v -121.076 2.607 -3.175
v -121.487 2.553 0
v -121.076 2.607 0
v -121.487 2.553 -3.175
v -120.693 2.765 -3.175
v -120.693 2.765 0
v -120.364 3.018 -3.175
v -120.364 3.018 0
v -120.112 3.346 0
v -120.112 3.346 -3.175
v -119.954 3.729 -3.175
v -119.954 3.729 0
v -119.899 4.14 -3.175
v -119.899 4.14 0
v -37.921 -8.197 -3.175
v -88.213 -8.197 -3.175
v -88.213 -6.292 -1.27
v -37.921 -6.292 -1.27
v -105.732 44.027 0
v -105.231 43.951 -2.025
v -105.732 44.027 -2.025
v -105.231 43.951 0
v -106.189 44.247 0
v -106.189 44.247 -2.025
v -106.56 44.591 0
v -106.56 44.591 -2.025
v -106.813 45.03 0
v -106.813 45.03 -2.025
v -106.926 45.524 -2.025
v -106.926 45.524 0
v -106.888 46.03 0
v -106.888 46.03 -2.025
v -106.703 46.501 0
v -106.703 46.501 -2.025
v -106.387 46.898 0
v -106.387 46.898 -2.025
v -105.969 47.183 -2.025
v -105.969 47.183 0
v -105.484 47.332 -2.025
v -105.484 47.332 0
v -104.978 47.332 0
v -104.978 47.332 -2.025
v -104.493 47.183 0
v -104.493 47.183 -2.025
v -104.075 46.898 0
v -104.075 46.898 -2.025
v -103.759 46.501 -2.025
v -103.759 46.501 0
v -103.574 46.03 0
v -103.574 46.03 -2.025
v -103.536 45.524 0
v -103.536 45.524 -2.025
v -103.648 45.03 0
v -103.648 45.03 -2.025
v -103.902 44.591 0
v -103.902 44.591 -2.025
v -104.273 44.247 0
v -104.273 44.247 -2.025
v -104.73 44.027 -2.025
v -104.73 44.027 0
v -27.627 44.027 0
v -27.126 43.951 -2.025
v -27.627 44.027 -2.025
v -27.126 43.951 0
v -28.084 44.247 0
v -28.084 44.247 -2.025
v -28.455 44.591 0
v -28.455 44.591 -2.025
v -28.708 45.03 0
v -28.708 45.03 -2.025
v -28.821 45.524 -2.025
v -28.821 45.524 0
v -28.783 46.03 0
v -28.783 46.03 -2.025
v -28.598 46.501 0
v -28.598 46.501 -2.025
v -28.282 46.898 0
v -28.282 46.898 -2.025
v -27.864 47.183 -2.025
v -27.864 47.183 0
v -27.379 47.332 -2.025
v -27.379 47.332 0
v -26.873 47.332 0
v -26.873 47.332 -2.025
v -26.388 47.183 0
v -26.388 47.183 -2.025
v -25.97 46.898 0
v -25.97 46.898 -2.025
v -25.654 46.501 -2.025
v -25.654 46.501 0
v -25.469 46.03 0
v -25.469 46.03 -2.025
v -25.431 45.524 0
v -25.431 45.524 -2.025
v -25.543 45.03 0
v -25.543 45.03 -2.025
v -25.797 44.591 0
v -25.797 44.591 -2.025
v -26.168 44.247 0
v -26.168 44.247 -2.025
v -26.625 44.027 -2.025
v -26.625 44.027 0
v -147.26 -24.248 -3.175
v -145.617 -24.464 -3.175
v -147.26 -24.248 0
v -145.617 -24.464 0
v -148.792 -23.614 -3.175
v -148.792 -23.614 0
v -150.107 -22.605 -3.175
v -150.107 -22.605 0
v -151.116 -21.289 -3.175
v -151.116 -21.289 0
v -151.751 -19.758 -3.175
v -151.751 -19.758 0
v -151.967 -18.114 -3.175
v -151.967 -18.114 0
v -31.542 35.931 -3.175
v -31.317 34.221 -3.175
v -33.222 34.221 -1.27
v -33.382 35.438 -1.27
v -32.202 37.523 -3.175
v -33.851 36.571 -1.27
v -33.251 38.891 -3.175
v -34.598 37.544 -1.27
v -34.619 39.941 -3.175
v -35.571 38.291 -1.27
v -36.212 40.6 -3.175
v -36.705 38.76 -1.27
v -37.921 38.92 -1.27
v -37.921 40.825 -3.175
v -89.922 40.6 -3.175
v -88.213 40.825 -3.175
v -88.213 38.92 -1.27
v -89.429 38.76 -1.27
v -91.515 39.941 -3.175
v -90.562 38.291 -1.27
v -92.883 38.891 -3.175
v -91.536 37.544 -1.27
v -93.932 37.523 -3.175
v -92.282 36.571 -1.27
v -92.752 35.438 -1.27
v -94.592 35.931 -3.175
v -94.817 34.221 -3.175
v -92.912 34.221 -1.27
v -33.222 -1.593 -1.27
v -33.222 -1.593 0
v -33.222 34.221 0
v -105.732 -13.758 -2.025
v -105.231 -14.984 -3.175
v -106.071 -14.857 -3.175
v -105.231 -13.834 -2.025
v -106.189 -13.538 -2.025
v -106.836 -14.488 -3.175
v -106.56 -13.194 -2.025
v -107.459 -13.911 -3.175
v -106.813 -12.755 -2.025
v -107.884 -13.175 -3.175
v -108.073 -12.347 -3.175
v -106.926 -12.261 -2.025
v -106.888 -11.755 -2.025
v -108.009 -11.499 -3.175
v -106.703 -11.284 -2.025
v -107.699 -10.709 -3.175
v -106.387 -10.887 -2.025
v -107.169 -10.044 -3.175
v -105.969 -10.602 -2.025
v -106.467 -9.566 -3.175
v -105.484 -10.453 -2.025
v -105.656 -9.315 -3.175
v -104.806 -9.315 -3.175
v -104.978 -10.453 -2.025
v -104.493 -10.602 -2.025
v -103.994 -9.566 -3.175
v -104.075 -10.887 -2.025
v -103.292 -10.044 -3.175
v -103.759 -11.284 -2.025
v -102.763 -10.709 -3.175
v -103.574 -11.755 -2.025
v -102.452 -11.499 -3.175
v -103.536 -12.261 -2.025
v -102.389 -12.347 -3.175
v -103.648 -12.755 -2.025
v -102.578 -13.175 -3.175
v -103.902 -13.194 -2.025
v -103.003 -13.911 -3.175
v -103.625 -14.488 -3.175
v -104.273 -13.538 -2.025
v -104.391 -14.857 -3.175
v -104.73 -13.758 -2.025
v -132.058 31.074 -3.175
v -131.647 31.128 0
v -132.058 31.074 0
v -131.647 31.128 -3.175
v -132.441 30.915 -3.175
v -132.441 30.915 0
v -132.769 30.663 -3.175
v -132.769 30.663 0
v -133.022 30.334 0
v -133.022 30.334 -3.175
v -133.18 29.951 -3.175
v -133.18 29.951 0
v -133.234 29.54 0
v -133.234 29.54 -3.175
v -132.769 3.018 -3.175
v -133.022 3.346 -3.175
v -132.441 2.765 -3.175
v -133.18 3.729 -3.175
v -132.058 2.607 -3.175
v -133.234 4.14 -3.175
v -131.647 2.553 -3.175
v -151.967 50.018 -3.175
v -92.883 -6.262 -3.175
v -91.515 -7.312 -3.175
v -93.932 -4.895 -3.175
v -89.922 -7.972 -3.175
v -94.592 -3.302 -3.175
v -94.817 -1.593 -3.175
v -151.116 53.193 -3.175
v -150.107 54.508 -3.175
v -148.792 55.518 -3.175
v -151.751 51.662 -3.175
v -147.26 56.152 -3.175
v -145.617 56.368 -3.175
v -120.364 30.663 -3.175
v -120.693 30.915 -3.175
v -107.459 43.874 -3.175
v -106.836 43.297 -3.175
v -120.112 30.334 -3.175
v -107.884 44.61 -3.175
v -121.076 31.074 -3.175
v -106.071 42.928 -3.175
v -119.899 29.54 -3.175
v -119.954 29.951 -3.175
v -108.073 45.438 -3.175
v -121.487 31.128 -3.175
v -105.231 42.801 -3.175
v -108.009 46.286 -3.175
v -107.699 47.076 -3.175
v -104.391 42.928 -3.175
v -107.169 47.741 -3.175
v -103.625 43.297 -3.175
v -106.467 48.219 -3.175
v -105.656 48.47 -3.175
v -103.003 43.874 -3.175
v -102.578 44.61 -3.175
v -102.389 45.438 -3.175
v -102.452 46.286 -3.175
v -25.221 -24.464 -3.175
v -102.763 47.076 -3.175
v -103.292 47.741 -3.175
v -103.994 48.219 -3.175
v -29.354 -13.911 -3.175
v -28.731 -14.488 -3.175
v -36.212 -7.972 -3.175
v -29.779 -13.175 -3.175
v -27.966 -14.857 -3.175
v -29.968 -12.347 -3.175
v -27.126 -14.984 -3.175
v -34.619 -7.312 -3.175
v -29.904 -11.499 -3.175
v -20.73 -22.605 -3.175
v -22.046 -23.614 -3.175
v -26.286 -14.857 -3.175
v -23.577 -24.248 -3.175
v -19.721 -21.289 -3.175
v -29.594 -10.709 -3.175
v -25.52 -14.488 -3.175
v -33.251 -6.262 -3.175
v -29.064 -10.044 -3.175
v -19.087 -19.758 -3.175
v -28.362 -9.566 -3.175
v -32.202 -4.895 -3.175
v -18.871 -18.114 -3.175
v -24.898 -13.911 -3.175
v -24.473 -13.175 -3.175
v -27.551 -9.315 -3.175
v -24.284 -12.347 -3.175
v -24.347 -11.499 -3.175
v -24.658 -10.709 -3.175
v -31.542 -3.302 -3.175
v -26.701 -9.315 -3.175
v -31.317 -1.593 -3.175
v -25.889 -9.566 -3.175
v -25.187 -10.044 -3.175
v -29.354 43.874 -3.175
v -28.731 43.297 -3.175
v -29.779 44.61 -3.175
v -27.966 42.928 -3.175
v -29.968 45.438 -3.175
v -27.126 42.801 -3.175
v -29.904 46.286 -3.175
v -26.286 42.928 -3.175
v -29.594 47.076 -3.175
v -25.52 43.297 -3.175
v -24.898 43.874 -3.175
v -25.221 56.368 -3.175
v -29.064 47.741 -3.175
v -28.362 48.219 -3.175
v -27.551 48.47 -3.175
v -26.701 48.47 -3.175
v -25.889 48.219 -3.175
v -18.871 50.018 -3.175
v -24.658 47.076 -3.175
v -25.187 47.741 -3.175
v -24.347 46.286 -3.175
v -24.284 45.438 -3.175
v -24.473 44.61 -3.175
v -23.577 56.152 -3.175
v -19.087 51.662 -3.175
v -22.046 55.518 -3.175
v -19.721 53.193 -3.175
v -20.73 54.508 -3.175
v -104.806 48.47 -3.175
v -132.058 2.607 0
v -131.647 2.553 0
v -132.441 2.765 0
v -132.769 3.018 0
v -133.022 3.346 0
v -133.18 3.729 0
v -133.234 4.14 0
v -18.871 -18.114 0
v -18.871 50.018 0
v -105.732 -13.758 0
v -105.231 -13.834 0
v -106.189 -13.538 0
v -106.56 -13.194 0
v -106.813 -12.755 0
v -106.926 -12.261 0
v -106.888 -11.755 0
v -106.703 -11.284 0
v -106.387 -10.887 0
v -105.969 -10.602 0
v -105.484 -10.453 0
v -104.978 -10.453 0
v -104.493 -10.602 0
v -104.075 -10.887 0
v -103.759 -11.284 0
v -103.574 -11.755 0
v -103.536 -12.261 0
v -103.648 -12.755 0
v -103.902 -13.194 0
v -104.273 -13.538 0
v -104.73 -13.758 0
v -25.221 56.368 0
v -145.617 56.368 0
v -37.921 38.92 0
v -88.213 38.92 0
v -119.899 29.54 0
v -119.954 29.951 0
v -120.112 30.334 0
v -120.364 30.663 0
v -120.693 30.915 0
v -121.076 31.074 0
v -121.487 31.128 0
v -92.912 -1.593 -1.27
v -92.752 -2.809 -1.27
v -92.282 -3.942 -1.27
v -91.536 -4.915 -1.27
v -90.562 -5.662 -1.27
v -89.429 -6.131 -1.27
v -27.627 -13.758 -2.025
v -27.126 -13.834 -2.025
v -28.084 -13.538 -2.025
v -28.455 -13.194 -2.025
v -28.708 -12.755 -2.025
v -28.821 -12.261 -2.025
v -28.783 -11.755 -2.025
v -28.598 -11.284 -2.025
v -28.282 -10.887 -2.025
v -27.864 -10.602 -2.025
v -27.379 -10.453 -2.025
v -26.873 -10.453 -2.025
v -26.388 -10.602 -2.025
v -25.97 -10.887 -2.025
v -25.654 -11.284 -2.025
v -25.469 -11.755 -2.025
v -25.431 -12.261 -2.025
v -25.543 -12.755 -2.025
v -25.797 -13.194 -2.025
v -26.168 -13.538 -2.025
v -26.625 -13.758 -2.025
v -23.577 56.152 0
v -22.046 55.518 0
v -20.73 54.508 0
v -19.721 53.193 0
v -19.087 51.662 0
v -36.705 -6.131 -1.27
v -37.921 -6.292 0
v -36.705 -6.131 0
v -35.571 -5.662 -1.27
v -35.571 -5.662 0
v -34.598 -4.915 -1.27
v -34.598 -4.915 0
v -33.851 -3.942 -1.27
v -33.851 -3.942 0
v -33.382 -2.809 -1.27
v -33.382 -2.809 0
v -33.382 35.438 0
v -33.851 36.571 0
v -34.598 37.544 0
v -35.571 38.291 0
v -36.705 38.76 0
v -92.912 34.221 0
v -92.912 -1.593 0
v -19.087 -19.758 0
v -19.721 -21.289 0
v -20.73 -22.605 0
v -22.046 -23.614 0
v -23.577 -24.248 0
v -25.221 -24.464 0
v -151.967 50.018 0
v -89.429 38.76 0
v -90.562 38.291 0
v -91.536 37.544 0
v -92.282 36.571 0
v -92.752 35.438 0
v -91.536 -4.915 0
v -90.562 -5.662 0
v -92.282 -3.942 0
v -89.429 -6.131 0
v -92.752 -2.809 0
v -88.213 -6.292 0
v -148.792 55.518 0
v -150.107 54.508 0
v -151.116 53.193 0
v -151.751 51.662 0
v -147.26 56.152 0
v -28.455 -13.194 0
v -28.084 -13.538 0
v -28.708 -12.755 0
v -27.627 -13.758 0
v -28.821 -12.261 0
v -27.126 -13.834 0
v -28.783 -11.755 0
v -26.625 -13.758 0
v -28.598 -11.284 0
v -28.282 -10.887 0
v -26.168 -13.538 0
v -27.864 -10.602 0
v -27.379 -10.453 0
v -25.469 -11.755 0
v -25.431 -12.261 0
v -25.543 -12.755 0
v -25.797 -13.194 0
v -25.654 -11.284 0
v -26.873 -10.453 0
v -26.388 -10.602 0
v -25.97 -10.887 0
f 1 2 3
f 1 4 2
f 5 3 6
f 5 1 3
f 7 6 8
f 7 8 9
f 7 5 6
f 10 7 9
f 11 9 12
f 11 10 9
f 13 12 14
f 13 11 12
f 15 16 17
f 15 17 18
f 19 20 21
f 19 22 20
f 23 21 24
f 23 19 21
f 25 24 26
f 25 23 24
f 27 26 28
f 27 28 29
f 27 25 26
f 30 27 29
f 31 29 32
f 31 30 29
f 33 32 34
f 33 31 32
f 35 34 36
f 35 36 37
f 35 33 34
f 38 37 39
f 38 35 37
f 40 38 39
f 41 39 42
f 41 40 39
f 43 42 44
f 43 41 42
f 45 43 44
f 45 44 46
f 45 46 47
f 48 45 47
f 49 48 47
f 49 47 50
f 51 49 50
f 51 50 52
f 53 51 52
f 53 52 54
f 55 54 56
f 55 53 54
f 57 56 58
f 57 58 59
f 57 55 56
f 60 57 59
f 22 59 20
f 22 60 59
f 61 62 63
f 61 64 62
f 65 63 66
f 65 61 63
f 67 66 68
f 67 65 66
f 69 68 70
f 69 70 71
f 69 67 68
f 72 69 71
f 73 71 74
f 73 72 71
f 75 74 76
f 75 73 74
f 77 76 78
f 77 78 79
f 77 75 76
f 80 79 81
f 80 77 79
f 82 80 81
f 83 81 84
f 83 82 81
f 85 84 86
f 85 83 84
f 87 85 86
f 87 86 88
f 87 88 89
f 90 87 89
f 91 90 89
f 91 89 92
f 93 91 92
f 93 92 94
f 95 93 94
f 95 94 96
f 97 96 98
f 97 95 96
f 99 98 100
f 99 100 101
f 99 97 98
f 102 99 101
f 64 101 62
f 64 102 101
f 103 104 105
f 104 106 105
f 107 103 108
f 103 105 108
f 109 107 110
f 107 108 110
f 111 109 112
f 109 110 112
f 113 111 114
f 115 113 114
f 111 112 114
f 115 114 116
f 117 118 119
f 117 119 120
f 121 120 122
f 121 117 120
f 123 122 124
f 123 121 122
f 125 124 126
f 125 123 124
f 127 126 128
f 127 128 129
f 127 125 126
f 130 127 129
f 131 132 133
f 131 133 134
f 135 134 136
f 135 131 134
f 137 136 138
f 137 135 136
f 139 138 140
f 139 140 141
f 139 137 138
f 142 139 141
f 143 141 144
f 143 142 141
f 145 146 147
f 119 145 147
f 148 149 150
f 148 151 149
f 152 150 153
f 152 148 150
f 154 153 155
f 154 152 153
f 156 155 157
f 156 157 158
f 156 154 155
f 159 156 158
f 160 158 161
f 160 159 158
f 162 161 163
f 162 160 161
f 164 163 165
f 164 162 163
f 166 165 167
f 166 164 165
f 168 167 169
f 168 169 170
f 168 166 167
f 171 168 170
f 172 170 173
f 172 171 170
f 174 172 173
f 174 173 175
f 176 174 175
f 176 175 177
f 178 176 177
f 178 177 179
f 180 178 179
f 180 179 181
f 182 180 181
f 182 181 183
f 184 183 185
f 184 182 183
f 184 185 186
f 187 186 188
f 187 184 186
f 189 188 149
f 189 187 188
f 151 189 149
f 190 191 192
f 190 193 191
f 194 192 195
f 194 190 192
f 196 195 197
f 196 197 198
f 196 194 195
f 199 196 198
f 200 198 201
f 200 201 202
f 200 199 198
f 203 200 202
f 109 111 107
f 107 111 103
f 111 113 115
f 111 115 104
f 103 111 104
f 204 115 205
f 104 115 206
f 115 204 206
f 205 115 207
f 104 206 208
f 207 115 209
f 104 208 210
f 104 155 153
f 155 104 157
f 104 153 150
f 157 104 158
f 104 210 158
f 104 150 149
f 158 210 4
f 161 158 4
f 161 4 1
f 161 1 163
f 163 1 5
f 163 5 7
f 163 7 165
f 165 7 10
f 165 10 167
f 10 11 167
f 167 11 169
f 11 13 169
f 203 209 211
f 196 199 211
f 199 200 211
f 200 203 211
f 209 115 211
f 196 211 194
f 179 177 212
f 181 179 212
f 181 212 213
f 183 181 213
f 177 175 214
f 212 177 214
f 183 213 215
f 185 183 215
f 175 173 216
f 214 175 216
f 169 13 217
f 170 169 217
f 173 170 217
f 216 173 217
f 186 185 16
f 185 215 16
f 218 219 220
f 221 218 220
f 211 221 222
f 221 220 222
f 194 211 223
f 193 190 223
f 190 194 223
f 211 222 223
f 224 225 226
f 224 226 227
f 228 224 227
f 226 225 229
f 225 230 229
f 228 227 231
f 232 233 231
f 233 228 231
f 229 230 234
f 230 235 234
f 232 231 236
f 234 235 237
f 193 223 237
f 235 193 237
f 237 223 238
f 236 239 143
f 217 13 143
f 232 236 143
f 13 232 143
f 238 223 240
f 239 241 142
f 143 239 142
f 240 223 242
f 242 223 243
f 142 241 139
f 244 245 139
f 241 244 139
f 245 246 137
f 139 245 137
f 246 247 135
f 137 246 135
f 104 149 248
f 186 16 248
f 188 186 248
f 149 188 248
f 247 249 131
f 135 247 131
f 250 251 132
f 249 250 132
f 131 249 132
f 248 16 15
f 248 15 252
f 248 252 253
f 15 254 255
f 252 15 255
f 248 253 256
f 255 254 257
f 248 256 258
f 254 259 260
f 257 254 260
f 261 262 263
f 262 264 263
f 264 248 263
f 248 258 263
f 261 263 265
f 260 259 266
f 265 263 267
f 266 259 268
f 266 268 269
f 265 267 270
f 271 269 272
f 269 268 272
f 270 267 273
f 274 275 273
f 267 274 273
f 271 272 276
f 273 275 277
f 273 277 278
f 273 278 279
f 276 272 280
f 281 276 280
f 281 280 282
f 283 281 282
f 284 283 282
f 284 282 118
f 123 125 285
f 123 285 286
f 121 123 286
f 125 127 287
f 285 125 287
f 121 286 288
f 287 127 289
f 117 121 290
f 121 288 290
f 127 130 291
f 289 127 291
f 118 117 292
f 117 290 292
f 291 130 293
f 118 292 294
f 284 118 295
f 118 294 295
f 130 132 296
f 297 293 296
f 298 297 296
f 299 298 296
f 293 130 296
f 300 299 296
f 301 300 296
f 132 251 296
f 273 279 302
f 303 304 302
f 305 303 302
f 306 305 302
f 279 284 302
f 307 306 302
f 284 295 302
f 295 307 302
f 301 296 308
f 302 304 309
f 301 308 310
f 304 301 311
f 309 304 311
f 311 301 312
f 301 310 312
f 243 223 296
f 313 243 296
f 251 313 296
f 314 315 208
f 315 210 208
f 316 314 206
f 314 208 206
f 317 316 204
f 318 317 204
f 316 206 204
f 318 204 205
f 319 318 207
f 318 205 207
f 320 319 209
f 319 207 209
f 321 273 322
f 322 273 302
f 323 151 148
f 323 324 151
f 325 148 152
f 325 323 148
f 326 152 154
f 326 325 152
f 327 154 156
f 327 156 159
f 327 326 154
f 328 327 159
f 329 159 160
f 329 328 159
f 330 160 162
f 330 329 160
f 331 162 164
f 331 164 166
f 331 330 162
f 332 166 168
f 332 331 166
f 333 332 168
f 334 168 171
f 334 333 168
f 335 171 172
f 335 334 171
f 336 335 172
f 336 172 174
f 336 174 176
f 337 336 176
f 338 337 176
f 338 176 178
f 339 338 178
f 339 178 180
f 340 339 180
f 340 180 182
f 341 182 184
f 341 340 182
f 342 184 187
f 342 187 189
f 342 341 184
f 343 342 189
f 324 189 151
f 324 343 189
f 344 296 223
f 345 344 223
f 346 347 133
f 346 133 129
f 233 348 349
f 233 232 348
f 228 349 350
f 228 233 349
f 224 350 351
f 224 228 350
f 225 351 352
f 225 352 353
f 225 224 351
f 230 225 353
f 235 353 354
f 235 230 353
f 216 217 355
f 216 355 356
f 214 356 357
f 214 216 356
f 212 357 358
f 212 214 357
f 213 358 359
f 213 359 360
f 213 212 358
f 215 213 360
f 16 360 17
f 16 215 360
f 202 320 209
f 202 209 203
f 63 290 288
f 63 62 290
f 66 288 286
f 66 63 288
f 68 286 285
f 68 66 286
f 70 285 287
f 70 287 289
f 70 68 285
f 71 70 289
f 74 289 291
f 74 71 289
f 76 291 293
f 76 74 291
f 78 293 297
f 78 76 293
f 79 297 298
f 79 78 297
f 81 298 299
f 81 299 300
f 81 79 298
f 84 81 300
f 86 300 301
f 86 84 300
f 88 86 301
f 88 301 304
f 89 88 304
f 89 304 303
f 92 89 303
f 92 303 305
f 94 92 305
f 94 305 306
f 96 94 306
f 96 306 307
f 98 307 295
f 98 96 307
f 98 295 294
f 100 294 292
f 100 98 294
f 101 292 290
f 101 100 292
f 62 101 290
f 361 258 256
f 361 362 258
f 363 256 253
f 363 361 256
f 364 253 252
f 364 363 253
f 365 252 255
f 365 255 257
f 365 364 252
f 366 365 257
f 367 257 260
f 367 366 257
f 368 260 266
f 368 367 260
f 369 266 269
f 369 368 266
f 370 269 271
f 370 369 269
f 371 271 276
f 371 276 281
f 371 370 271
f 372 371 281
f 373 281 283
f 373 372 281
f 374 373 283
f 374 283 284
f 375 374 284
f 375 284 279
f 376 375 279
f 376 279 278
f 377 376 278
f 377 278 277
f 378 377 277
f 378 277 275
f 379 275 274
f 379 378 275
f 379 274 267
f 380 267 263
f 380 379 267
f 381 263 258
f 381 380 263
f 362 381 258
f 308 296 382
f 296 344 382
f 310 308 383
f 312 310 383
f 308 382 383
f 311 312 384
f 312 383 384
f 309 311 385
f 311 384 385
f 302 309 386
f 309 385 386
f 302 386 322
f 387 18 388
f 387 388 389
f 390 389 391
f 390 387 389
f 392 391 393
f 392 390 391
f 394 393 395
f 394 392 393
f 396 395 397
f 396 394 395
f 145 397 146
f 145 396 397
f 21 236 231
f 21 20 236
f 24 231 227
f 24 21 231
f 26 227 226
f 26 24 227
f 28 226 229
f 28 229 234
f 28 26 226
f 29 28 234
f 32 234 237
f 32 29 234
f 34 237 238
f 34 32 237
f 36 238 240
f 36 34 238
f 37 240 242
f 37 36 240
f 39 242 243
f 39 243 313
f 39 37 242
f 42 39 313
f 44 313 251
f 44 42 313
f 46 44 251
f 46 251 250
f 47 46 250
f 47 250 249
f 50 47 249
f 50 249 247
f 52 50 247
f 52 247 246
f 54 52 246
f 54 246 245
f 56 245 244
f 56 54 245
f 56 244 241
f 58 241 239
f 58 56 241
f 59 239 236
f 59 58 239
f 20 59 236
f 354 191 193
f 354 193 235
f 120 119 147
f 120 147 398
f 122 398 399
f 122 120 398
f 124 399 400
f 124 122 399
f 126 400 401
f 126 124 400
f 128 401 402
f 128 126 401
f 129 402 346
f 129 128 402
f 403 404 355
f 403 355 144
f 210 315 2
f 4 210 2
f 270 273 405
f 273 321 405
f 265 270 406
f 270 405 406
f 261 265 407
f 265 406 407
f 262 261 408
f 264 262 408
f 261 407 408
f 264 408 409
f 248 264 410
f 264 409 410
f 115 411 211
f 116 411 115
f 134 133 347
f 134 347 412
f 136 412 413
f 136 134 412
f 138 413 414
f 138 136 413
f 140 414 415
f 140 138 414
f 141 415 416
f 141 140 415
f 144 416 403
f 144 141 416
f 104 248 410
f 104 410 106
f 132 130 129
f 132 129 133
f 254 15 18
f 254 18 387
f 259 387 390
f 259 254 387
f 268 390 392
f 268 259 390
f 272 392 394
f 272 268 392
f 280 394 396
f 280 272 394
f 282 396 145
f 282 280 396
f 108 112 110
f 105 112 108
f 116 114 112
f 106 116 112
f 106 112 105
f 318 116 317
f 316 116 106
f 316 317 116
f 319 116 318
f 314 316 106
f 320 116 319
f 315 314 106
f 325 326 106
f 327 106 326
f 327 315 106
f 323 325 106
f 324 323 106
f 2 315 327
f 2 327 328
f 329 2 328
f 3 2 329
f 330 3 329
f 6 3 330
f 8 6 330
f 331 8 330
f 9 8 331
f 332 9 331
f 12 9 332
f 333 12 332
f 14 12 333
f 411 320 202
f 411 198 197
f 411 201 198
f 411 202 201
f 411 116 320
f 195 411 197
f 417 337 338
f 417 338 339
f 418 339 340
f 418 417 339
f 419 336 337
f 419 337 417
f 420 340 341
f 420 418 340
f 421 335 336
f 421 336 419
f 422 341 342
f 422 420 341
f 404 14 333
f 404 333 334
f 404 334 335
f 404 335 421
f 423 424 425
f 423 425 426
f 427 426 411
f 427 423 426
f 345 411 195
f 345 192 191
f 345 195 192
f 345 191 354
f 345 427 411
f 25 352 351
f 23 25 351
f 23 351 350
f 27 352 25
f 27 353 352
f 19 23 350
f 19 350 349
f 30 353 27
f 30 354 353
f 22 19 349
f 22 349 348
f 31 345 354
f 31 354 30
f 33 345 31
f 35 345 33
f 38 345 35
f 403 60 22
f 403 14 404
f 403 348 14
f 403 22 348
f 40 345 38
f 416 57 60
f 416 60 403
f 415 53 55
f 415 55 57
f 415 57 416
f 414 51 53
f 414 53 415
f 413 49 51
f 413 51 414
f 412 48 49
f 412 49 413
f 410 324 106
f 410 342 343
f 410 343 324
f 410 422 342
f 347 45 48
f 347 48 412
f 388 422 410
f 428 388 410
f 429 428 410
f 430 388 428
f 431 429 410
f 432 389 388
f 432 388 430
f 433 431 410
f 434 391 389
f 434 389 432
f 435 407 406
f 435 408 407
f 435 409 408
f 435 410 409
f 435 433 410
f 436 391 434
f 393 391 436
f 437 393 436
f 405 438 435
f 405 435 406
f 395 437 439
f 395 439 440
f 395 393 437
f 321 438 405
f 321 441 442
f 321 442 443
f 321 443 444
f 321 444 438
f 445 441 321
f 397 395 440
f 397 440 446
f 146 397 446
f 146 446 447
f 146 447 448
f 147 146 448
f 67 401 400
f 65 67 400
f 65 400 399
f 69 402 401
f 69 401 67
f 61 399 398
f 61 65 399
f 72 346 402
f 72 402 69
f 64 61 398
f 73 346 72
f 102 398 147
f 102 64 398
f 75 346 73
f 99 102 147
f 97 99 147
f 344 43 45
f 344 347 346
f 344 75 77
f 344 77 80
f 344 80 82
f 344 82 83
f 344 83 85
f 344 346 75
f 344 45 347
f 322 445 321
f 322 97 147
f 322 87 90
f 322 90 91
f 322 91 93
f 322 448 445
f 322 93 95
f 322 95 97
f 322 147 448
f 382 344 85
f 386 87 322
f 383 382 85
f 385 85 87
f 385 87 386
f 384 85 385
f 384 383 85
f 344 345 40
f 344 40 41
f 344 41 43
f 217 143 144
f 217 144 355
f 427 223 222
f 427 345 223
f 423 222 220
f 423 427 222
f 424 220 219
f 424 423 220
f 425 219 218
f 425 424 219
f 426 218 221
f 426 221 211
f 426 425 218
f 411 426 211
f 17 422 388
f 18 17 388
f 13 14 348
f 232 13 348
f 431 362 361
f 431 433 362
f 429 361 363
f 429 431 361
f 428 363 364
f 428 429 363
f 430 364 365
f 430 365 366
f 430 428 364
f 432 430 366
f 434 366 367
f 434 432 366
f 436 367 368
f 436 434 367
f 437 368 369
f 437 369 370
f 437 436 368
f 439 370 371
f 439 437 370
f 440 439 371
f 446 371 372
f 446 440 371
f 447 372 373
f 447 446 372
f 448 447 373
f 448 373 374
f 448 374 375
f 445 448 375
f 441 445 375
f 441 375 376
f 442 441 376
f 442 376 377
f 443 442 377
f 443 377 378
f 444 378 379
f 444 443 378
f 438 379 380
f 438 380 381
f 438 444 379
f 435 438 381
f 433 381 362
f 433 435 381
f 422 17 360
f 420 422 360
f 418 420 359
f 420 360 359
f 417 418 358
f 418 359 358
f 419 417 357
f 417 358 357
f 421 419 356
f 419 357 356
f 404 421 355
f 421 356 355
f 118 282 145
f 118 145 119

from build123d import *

# Parameters (mm, degrees)
BOSS_EXTRUDE1_DEPTH             = 3.175
F_6_CLEARANCE_HOLE1_AT_2_COUNT  = 2
F_6_CLEARANCE_HOLE1_AT_2_PITCH  = 202.184
F_6_CLEARANCE_HOLE1_AT_3_COUNT  = 2
F_6_CLEARANCE_HOLE1_AT_3_PITCH  = 245.533205315
F_6_CLEARANCE_HOLE1_AT_4_COUNT  = 2
F_6_CLEARANCE_HOLE1_AT_4_PITCH  = 294.732330958
F_6_CLEARANCE_HOLE1_AT_5_COUNT  = 2
F_6_CLEARANCE_HOLE1_AT_5_PITCH  = 209.296
F_6_CLEARANCE_HOLE1_AT_6_COUNT  = 2
F_6_CLEARANCE_HOLE1_AT_6_PITCH  = 172.811757411
F_6_CLEARANCE_HOLE1_AT_7_COUNT  = 2
F_6_CLEARANCE_HOLE1_AT_7_PITCH  = 57.300187604
F_6_CLEARANCE_HOLE1_AT_8_COUNT  = 2
F_6_CLEARANCE_HOLE1_AT_8_PITCH  = 291.003755082
F_6_CLEARANCE_HOLE1_AT_9_COUNT  = 2
F_6_CLEARANCE_HOLE1_AT_9_PITCH  = 232.431512666
F_6_CLEARANCE_HOLE1_AT_10_COUNT = 2
F_6_CLEARANCE_HOLE1_AT_10_PITCH = 101.092
SKETCH23_R                      = 24.765
CUT_EXTRUDE10_DEPTH             = 191.76187976
SKETCH24_W                      = 59.69
SKETCH24_H                      = 45.212
CUT_EXTRUDE11_DEPTH             = 191.76187976
FILLET2_R                       = 4.699
CHAMFER1_SIZE                   = 1.905
M3_CLEARANCE_HOLE3_AT_2_COUNT   = 2
M3_CLEARANCE_HOLE3_AT_2_PITCH   = 49.391408666
M3_CLEARANCE_HOLE3_AT_3_COUNT   = 2
M3_CLEARANCE_HOLE3_AT_3_PITCH   = 69.85
M3_CLEARANCE_HOLE3_AT_4_COUNT   = 2
M3_CLEARANCE_HOLE3_AT_4_PITCH   = 49.391408666
M3_CLEARANCE_HOLE1_D            = 3.6
M3_CLEARANCE_HOLE1_CSINK_D      = 5.7
M3_CLEARANCE_HOLE1_CSINK_ANGLE  = 90
M3_CLEARANCE_HOLE2_AT_2_COUNT   = 2
M3_CLEARANCE_HOLE2_AT_2_PITCH   = 56.70042
M3_CLEARANCE_HOLE2_AT_3_COUNT   = 2
M3_CLEARANCE_HOLE2_AT_3_PITCH   = 102.00589147
M3_CLEARANCE_HOLE2_AT_4_COUNT   = 2
M3_CLEARANCE_HOLE2_AT_4_PITCH   = 109.267844742
M3_CLEARANCE_HOLE2_AT_5_COUNT   = 2
M3_CLEARANCE_HOLE2_AT_5_PITCH   = 65.600653918
M3_CLEARANCE_HOLE2_AT_6_COUNT   = 2
M3_CLEARANCE_HOLE2_AT_6_PITCH   = 76.404880698
M3_CLEARANCE_HOLE2_AT_7_COUNT   = 2
M3_CLEARANCE_HOLE2_AT_7_PITCH   = 27.404059918
M3_CLEARANCE_HOLE2_AT_8_COUNT   = 2
M3_CLEARANCE_HOLE2_AT_8_PITCH   = 55.968061912
SKETCH35_W                      = 13.335
SKETCH35_H                      = 28.575
CUT_EXTRUDE12_DEPTH             = 191.76187976
FILLET1_R                       = 1.5875
F_8_0MM_DOWEL_HOLE1_D           = 8
M3_CLEARANCE_HOLE4_AT_2_COUNT   = 2
M3_CLEARANCE_HOLE4_AT_2_PITCH   = 78.105
M3_CLEARANCE_HOLE4_AT_3_COUNT   = 2
M3_CLEARANCE_HOLE4_AT_3_PITCH   = 97.157075141
M3_CLEARANCE_HOLE4_AT_4_COUNT   = 2
M3_CLEARANCE_HOLE4_AT_4_PITCH   = 57.785
SKETCH42_OUTSIDE_W              = 382.23
SKETCH42_OUTSIDE_H              = 308.826
SKETCH42_OUTSIDE_W_2            = 133.096408578
SKETCH42_OUTSIDE_H_2            = 80.832743403
CUT_EXTRUDE13_DEPTH             = 191.76187976
FILLET3_R                       = 6.35


with BuildPart() as part:
    # Sketch1 → Boss-Extrude1 (new body)
    with BuildSketch(Plane.XY):
        with BuildLine():
            Line((-151.96693, 98.7552), (-151.96693, -98.7552))
            ThreePointArc((-151.96693, -98.7552), (-147.131262957, -110.429532957), (-135.45693, -115.2652))
            Line((-135.45693, -115.2652), (135.45693, -115.2652))
            ThreePointArc((135.45693, -115.2652), (147.131262957, -110.429532957), (151.96693, -98.7552))
            Line((151.96693, -98.7552), (151.96693, 98.7552))
            ThreePointArc((151.96693, 98.7552), (147.131262957, 110.429532957), (135.45693, 115.2652))
            Line((135.45693, 115.2652), (-135.45693, 115.2652))
            ThreePointArc((-135.45693, 115.2652), (-147.131262957, 110.429532957), (-151.96693, 98.7552))
        make_face()
    extrude(amount=-BOSS_EXTRUDE1_DEPTH)

    # Sketch3 → #6 Clearance Hole1 (revolve, cut)
    with BuildSketch(Plane(origin=(101.092, 104.648, 0), x_dir=(0, -1, 0), z_dir=(1, 0, 0))):
        Polygon((0, 0), (0, 3.175), (3.3655, 3.175), (2.15265, 2.157298012), (2.15265, 0), align=None)
    f_6_clearance_hole1 = revolve(axis=Axis((101.092, 104.648, 6.35), (0, 0, -1)), mode=Mode.SUBTRACT)

    # #6 Clearance Hole1 at 2: #6 Clearance Hole1 ×2
    with Locations(*[(-i * F_6_CLEARANCE_HOLE1_AT_2_PITCH, 0, 0) for i in range(1, F_6_CLEARANCE_HOLE1_AT_2_COUNT)]):
        add(f_6_clearance_hole1, mode=Mode.SUBTRACT)

    # #6 Clearance Hole1 at 3: #6 Clearance Hole1 ×2
    with Locations(*[Vector(-0.9858574105677721, -0.1675862942743448, 0) * (i * F_6_CLEARANCE_HOLE1_AT_3_PITCH) for i in range(1, F_6_CLEARANCE_HOLE1_AT_3_COUNT)]):
        add(f_6_clearance_hole1, mode=Mode.SUBTRACT)

    # #6 Clearance Hole1 at 4: #6 Clearance Hole1 ×2
    with Locations(*[Vector(-0.8212900471859665, -0.5705108749123656, 0) * (i * F_6_CLEARANCE_HOLE1_AT_4_PITCH) for i in range(1, F_6_CLEARANCE_HOLE1_AT_4_COUNT)]):
        add(f_6_clearance_hole1, mode=Mode.SUBTRACT)

    # #6 Clearance Hole1 at 5: #6 Clearance Hole1 ×2
    with Locations(*[(0, -i * F_6_CLEARANCE_HOLE1_AT_5_PITCH, 0) for i in range(1, F_6_CLEARANCE_HOLE1_AT_5_COUNT)]):
        add(f_6_clearance_hole1, mode=Mode.SUBTRACT)

    # #6 Clearance Hole1 at 6: #6 Clearance Hole1 ×2
    with Locations(*[Vector(0.23075241289949347, -0.9730124993755537, 0) * (i * F_6_CLEARANCE_HOLE1_AT_6_PITCH) for i in range(1, F_6_CLEARANCE_HOLE1_AT_6_COUNT)]):
        add(f_6_clearance_hole1, mode=Mode.SUBTRACT)

    # #6 Clearance Hole1 at 7: #6 Clearance Hole1 ×2
    with Locations(*[Vector(0.6959266918172804, -0.7181128320927402, 0) * (i * F_6_CLEARANCE_HOLE1_AT_7_PITCH) for i in range(1, F_6_CLEARANCE_HOLE1_AT_7_COUNT)]):
        add(f_6_clearance_hole1, mode=Mode.SUBTRACT)

    # #6 Clearance Hole1 at 8: #6 Clearance Hole1 ×2
    with Locations(*[Vector(-0.6947814125038304, -0.719220959677332, 0) * (i * F_6_CLEARANCE_HOLE1_AT_8_PITCH) for i in range(1, F_6_CLEARANCE_HOLE1_AT_8_COUNT)]):
        add(f_6_clearance_hole1, mode=Mode.SUBTRACT)

    # #6 Clearance Hole1 at 9: #6 Clearance Hole1 ×2
    with Locations(*[Vector(-0.4349324187613887, -0.9004630981391565, 0) * (i * F_6_CLEARANCE_HOLE1_AT_9_PITCH) for i in range(1, F_6_CLEARANCE_HOLE1_AT_9_COUNT)]):
        add(f_6_clearance_hole1, mode=Mode.SUBTRACT)

    # #6 Clearance Hole1 at 10: #6 Clearance Hole1 ×2
    with Locations(*[(-i * F_6_CLEARANCE_HOLE1_AT_10_PITCH, 0, 0) for i in range(1, F_6_CLEARANCE_HOLE1_AT_10_COUNT)]):
        add(f_6_clearance_hole1, mode=Mode.SUBTRACT)

    # Sketch23 → Cut-Extrude10 (cut, through all)
    with BuildSketch(Plane.XY):
        with Locations((104.26573, 42.164)):
            Circle(SKETCH23_R)
    extrude(amount=-CUT_EXTRUDE10_DEPTH, mode=Mode.SUBTRACT)

    # Sketch24 → Cut-Extrude11 (cut, through all)
    with BuildSketch(Plane.XY):
        with Locations((-63.06693, 16.31442)):
            Rectangle(SKETCH24_W, SKETCH24_H)
    extrude(amount=-CUT_EXTRUDE11_DEPTH, mode=Mode.SUBTRACT)

    # Fillet2
    fillet2_edges = [part.edges().sort_by_distance(p)[0] for p in [
        (-92.91193, -6.29158, -1.5875),
        (-92.91193, 38.92042, -1.5875),
        (-33.22193, 38.92042, -1.5875),
        (-33.22193, -6.29158, -1.5875),
    ]]
    fillet(fillet2_edges, radius=FILLET2_R)

    # Chamfer1
    chamfer1_edges = [part.edges().sort_by_distance(p)[0] for p in [
        (-33.22193, 16.31442, -3.175),
        (-63.06693, -6.29158, -3.175),
        (-92.91193, 16.31442, -3.175),
        (-63.06693, 38.92042, -3.175),
        (-34.598235235, -4.915274765, -3.175),
        (-91.535624765, -4.915274765, -3.175),
        (-91.535624765, 37.544114765, -3.175),
        (-34.598235235, 37.544114765, -3.175),
    ]]
    chamfer(chamfer1_edges, length=CHAMFER1_SIZE)

    # Sketch30 → M3 Clearance Hole3 (revolve, cut)
    with BuildSketch(Plane(origin=(79.570025667, 66.859704333, 0), x_dir=(0, -1, 0), z_dir=(1, 0, 0))):
        Polygon((0, 0), (0, 3.175), (2.85, 3.175), (1.8, 2.125), (1.8, 0), align=None)
    m3_clearance_hole3 = revolve(axis=Axis((79.570025667, 66.859704333, 6.35), (0, 0, -1)), mode=Mode.SUBTRACT)

    # M3 Clearance Hole3 at 2: M3 Clearance Hole3 ×2
    with Locations(*[(i * M3_CLEARANCE_HOLE3_AT_2_PITCH, 0, 0) for i in range(1, M3_CLEARANCE_HOLE3_AT_2_COUNT)]):
        add(m3_clearance_hole3, mode=Mode.SUBTRACT)

    # M3 Clearance Hole3 at 3: M3 Clearance Hole3 ×2
    with Locations(*[Vector(0.7071067811865477, -0.7071067811865475, 0) * (i * M3_CLEARANCE_HOLE3_AT_3_PITCH) for i in range(1, M3_CLEARANCE_HOLE3_AT_3_COUNT)]):
        add(m3_clearance_hole3, mode=Mode.SUBTRACT)

    # M3 Clearance Hole3 at 4: M3 Clearance Hole3 ×2
    with Locations(*[(0, -i * M3_CLEARANCE_HOLE3_AT_4_PITCH, 0) for i in range(1, M3_CLEARANCE_HOLE3_AT_4_COUNT)]):
        add(m3_clearance_hole3, mode=Mode.SUBTRACT)

    # M3 Clearance Hole1 (through all)
    with Locations(Plane(origin=(0, 0, -3.175), x_dir=(-1, 0, 0), z_dir=(0, 0, -1))):
        with Locations((17.67693, -38.5952), (117.67693, -38.5952), (117.67693, -88.5952), (17.67693, -88.5952)):
            CounterSinkHole(M3_CLEARANCE_HOLE1_D / 2, M3_CLEARANCE_HOLE1_CSINK_D / 2, counter_sink_angle=M3_CLEARANCE_HOLE1_CSINK_ANGLE)

    # Sketch34 → M3 Clearance Hole2 (revolve, cut)
    with BuildSketch(Plane(origin=(25.25193, -75.5297, 0), x_dir=(0, -1, 0), z_dir=(1, 0, 0))):
        Polygon((0, 0), (0, 3.175), (2.85, 3.175), (1.8, 2.125), (1.8, 0), align=None)
    m3_clearance_hole2 = revolve(axis=Axis((25.25193, -75.5297, 6.35), (0, 0, -1)), mode=Mode.SUBTRACT)

    # M3 Clearance Hole2 at 2: M3 Clearance Hole2 ×2
    with Locations(*[(i * M3_CLEARANCE_HOLE2_AT_2_PITCH, 0, 0) for i in range(1, M3_CLEARANCE_HOLE2_AT_2_COUNT)]):
        add(m3_clearance_hole2, mode=Mode.SUBTRACT)

    # M3 Clearance Hole2 at 3: M3 Clearance Hole2 ×2
    with Locations(*[Vector(0.9983315525499471, -0.05774176290357108, 0) * (i * M3_CLEARANCE_HOLE2_AT_3_PITCH) for i in range(1, M3_CLEARANCE_HOLE2_AT_3_COUNT)]):
        add(m3_clearance_hole2, mode=Mode.SUBTRACT)

    # M3 Clearance Hole2 at 4: M3 Clearance Hole2 ×2
    with Locations(*[Vector(0.9319823250907686, 0.36250371821321364, 0) * (i * M3_CLEARANCE_HOLE2_AT_4_PITCH) for i in range(1, M3_CLEARANCE_HOLE2_AT_4_COUNT)]):
        add(m3_clearance_hole2, mode=Mode.SUBTRACT)

    # M3 Clearance Hole2 at 5: M3 Clearance Hole2 ×2
    with Locations(*[Vector(0.9959611085814934, -0.089785690358334, 0) * (i * M3_CLEARANCE_HOLE2_AT_5_PITCH) for i in range(1, M3_CLEARANCE_HOLE2_AT_5_COUNT)]):
        add(m3_clearance_hole2, mode=Mode.SUBTRACT)

    # M3 Clearance Hole2 at 6: M3 Clearance Hole2 ×2
    with Locations(*[Vector(0.8551246910281444, 0.5184223787550272, 0) * (i * M3_CLEARANCE_HOLE2_AT_6_PITCH) for i in range(1, M3_CLEARANCE_HOLE2_AT_6_COUNT)]):
        add(m3_clearance_hole2, mode=Mode.SUBTRACT)

    # M3 Clearance Hole2 at 7: M3 Clearance Hole2 ×2
    with Locations(*[Vector(0.2682084341495708, 0.9633609063331537, 0) * (i * M3_CLEARANCE_HOLE2_AT_7_PITCH) for i in range(1, M3_CLEARANCE_HOLE2_AT_7_COUNT)]):
        add(m3_clearance_hole2, mode=Mode.SUBTRACT)

    # M3 Clearance Hole2 at 8: M3 Clearance Hole2 ×2
    with Locations(*[Vector(0.8817603882311722, 0.47169759141468215, 0) * (i * M3_CLEARANCE_HOLE2_AT_8_PITCH) for i in range(1, M3_CLEARANCE_HOLE2_AT_8_COUNT)]):
        add(m3_clearance_hole2, mode=Mode.SUBTRACT)

    # Sketch35 → Cut-Extrude12 (cut, through all)
    with BuildSketch(Plane.XY):
        with Locations((-126.56693, 16.8402)):
            Rectangle(SKETCH35_W, SKETCH35_H)
    extrude(amount=-CUT_EXTRUDE12_DEPTH, mode=Mode.SUBTRACT)

    # Fillet1
    fillet1_edges = [part.edges().sort_by_distance(p)[0] for p in [
        (-133.23443, 2.5527, -1.5875),
        (-133.23443, 31.1277, -1.5875),
        (-119.89943, 31.1277, -1.5875),
        (-119.89943, 2.5527, -1.5875),
    ]]
    fillet(fillet1_edges, radius=FILLET1_R)

    # Ø8.0mm Dowel Hole1 (through all)
    with Locations(Plane(origin=(0, 0, -3.175), x_dir=(-1, 0, 0), z_dir=(0, 0, -1))):
        with Locations((12.26693, 3.61442), (12.26693, 29.01442)):
            Hole(F_8_0MM_DOWEL_HOLE1_D / 2)

    # Sketch39 → M3 Clearance Hole4 (revolve, cut)
    with BuildSketch(Plane(origin=(-105.23093, 45.65142, 0), x_dir=(0, -1, 0), z_dir=(1, 0, 0))):
        Polygon((0, 0), (0, 3.175), (2.85, 3.175), (1.7, 2.025), (1.7, 0), align=None)
    m3_clearance_hole4 = revolve(axis=Axis((-105.23093, 45.65142, 6.35), (0, 0, -1)), mode=Mode.SUBTRACT)

    # M3 Clearance Hole4 at 2: M3 Clearance Hole4 ×2
    with Locations(*[(i * M3_CLEARANCE_HOLE4_AT_2_PITCH, 0, 0) for i in range(1, M3_CLEARANCE_HOLE4_AT_2_COUNT)]):
        add(m3_clearance_hole4, mode=Mode.SUBTRACT)

    # M3 Clearance Hole4 at 3: M3 Clearance Hole4 ×2
    with Locations(*[Vector(0.8039043979705941, -0.5947585383359678, 0) * (i * M3_CLEARANCE_HOLE4_AT_3_PITCH) for i in range(1, M3_CLEARANCE_HOLE4_AT_3_COUNT)]):
        add(m3_clearance_hole4, mode=Mode.SUBTRACT)

    # M3 Clearance Hole4 at 4: M3 Clearance Hole4 ×2
    with Locations(*[(0, -i * M3_CLEARANCE_HOLE4_AT_4_PITCH, 0) for i in range(1, M3_CLEARANCE_HOLE4_AT_4_COUNT)]):
        add(m3_clearance_hole4, mode=Mode.SUBTRACT)

    # Sketch42 outside → Cut-Extrude13 (cut, through all)
    with BuildSketch(Plane(origin=(0, 0, -3.175), x_dir=(-1, 0, 0), z_dir=(0, 0, -1))):
        Rectangle(SKETCH42_OUTSIDE_W, SKETCH42_OUTSIDE_H)
        with Locations((85.418725711, 15.951898655)):
            Rectangle(SKETCH42_OUTSIDE_W_2, SKETCH42_OUTSIDE_H_2, mode=Mode.SUBTRACT)
    extrude(amount=-CUT_EXTRUDE13_DEPTH, mode=Mode.SUBTRACT)

    # Fillet3
    fillet3_edges = [part.edges().sort_by_distance(p)[0] for p in [
        (-18.870521422, 56.368270356, -1.5875),
        (-151.96693, 56.368270356, -1.5875),
        (-151.96693, -24.464473047, -1.5875),
        (-18.870521422, -24.464473047, -1.5875),
    ]]
    fillet(fillet3_edges, radius=FILLET3_R)


solid = part.part
